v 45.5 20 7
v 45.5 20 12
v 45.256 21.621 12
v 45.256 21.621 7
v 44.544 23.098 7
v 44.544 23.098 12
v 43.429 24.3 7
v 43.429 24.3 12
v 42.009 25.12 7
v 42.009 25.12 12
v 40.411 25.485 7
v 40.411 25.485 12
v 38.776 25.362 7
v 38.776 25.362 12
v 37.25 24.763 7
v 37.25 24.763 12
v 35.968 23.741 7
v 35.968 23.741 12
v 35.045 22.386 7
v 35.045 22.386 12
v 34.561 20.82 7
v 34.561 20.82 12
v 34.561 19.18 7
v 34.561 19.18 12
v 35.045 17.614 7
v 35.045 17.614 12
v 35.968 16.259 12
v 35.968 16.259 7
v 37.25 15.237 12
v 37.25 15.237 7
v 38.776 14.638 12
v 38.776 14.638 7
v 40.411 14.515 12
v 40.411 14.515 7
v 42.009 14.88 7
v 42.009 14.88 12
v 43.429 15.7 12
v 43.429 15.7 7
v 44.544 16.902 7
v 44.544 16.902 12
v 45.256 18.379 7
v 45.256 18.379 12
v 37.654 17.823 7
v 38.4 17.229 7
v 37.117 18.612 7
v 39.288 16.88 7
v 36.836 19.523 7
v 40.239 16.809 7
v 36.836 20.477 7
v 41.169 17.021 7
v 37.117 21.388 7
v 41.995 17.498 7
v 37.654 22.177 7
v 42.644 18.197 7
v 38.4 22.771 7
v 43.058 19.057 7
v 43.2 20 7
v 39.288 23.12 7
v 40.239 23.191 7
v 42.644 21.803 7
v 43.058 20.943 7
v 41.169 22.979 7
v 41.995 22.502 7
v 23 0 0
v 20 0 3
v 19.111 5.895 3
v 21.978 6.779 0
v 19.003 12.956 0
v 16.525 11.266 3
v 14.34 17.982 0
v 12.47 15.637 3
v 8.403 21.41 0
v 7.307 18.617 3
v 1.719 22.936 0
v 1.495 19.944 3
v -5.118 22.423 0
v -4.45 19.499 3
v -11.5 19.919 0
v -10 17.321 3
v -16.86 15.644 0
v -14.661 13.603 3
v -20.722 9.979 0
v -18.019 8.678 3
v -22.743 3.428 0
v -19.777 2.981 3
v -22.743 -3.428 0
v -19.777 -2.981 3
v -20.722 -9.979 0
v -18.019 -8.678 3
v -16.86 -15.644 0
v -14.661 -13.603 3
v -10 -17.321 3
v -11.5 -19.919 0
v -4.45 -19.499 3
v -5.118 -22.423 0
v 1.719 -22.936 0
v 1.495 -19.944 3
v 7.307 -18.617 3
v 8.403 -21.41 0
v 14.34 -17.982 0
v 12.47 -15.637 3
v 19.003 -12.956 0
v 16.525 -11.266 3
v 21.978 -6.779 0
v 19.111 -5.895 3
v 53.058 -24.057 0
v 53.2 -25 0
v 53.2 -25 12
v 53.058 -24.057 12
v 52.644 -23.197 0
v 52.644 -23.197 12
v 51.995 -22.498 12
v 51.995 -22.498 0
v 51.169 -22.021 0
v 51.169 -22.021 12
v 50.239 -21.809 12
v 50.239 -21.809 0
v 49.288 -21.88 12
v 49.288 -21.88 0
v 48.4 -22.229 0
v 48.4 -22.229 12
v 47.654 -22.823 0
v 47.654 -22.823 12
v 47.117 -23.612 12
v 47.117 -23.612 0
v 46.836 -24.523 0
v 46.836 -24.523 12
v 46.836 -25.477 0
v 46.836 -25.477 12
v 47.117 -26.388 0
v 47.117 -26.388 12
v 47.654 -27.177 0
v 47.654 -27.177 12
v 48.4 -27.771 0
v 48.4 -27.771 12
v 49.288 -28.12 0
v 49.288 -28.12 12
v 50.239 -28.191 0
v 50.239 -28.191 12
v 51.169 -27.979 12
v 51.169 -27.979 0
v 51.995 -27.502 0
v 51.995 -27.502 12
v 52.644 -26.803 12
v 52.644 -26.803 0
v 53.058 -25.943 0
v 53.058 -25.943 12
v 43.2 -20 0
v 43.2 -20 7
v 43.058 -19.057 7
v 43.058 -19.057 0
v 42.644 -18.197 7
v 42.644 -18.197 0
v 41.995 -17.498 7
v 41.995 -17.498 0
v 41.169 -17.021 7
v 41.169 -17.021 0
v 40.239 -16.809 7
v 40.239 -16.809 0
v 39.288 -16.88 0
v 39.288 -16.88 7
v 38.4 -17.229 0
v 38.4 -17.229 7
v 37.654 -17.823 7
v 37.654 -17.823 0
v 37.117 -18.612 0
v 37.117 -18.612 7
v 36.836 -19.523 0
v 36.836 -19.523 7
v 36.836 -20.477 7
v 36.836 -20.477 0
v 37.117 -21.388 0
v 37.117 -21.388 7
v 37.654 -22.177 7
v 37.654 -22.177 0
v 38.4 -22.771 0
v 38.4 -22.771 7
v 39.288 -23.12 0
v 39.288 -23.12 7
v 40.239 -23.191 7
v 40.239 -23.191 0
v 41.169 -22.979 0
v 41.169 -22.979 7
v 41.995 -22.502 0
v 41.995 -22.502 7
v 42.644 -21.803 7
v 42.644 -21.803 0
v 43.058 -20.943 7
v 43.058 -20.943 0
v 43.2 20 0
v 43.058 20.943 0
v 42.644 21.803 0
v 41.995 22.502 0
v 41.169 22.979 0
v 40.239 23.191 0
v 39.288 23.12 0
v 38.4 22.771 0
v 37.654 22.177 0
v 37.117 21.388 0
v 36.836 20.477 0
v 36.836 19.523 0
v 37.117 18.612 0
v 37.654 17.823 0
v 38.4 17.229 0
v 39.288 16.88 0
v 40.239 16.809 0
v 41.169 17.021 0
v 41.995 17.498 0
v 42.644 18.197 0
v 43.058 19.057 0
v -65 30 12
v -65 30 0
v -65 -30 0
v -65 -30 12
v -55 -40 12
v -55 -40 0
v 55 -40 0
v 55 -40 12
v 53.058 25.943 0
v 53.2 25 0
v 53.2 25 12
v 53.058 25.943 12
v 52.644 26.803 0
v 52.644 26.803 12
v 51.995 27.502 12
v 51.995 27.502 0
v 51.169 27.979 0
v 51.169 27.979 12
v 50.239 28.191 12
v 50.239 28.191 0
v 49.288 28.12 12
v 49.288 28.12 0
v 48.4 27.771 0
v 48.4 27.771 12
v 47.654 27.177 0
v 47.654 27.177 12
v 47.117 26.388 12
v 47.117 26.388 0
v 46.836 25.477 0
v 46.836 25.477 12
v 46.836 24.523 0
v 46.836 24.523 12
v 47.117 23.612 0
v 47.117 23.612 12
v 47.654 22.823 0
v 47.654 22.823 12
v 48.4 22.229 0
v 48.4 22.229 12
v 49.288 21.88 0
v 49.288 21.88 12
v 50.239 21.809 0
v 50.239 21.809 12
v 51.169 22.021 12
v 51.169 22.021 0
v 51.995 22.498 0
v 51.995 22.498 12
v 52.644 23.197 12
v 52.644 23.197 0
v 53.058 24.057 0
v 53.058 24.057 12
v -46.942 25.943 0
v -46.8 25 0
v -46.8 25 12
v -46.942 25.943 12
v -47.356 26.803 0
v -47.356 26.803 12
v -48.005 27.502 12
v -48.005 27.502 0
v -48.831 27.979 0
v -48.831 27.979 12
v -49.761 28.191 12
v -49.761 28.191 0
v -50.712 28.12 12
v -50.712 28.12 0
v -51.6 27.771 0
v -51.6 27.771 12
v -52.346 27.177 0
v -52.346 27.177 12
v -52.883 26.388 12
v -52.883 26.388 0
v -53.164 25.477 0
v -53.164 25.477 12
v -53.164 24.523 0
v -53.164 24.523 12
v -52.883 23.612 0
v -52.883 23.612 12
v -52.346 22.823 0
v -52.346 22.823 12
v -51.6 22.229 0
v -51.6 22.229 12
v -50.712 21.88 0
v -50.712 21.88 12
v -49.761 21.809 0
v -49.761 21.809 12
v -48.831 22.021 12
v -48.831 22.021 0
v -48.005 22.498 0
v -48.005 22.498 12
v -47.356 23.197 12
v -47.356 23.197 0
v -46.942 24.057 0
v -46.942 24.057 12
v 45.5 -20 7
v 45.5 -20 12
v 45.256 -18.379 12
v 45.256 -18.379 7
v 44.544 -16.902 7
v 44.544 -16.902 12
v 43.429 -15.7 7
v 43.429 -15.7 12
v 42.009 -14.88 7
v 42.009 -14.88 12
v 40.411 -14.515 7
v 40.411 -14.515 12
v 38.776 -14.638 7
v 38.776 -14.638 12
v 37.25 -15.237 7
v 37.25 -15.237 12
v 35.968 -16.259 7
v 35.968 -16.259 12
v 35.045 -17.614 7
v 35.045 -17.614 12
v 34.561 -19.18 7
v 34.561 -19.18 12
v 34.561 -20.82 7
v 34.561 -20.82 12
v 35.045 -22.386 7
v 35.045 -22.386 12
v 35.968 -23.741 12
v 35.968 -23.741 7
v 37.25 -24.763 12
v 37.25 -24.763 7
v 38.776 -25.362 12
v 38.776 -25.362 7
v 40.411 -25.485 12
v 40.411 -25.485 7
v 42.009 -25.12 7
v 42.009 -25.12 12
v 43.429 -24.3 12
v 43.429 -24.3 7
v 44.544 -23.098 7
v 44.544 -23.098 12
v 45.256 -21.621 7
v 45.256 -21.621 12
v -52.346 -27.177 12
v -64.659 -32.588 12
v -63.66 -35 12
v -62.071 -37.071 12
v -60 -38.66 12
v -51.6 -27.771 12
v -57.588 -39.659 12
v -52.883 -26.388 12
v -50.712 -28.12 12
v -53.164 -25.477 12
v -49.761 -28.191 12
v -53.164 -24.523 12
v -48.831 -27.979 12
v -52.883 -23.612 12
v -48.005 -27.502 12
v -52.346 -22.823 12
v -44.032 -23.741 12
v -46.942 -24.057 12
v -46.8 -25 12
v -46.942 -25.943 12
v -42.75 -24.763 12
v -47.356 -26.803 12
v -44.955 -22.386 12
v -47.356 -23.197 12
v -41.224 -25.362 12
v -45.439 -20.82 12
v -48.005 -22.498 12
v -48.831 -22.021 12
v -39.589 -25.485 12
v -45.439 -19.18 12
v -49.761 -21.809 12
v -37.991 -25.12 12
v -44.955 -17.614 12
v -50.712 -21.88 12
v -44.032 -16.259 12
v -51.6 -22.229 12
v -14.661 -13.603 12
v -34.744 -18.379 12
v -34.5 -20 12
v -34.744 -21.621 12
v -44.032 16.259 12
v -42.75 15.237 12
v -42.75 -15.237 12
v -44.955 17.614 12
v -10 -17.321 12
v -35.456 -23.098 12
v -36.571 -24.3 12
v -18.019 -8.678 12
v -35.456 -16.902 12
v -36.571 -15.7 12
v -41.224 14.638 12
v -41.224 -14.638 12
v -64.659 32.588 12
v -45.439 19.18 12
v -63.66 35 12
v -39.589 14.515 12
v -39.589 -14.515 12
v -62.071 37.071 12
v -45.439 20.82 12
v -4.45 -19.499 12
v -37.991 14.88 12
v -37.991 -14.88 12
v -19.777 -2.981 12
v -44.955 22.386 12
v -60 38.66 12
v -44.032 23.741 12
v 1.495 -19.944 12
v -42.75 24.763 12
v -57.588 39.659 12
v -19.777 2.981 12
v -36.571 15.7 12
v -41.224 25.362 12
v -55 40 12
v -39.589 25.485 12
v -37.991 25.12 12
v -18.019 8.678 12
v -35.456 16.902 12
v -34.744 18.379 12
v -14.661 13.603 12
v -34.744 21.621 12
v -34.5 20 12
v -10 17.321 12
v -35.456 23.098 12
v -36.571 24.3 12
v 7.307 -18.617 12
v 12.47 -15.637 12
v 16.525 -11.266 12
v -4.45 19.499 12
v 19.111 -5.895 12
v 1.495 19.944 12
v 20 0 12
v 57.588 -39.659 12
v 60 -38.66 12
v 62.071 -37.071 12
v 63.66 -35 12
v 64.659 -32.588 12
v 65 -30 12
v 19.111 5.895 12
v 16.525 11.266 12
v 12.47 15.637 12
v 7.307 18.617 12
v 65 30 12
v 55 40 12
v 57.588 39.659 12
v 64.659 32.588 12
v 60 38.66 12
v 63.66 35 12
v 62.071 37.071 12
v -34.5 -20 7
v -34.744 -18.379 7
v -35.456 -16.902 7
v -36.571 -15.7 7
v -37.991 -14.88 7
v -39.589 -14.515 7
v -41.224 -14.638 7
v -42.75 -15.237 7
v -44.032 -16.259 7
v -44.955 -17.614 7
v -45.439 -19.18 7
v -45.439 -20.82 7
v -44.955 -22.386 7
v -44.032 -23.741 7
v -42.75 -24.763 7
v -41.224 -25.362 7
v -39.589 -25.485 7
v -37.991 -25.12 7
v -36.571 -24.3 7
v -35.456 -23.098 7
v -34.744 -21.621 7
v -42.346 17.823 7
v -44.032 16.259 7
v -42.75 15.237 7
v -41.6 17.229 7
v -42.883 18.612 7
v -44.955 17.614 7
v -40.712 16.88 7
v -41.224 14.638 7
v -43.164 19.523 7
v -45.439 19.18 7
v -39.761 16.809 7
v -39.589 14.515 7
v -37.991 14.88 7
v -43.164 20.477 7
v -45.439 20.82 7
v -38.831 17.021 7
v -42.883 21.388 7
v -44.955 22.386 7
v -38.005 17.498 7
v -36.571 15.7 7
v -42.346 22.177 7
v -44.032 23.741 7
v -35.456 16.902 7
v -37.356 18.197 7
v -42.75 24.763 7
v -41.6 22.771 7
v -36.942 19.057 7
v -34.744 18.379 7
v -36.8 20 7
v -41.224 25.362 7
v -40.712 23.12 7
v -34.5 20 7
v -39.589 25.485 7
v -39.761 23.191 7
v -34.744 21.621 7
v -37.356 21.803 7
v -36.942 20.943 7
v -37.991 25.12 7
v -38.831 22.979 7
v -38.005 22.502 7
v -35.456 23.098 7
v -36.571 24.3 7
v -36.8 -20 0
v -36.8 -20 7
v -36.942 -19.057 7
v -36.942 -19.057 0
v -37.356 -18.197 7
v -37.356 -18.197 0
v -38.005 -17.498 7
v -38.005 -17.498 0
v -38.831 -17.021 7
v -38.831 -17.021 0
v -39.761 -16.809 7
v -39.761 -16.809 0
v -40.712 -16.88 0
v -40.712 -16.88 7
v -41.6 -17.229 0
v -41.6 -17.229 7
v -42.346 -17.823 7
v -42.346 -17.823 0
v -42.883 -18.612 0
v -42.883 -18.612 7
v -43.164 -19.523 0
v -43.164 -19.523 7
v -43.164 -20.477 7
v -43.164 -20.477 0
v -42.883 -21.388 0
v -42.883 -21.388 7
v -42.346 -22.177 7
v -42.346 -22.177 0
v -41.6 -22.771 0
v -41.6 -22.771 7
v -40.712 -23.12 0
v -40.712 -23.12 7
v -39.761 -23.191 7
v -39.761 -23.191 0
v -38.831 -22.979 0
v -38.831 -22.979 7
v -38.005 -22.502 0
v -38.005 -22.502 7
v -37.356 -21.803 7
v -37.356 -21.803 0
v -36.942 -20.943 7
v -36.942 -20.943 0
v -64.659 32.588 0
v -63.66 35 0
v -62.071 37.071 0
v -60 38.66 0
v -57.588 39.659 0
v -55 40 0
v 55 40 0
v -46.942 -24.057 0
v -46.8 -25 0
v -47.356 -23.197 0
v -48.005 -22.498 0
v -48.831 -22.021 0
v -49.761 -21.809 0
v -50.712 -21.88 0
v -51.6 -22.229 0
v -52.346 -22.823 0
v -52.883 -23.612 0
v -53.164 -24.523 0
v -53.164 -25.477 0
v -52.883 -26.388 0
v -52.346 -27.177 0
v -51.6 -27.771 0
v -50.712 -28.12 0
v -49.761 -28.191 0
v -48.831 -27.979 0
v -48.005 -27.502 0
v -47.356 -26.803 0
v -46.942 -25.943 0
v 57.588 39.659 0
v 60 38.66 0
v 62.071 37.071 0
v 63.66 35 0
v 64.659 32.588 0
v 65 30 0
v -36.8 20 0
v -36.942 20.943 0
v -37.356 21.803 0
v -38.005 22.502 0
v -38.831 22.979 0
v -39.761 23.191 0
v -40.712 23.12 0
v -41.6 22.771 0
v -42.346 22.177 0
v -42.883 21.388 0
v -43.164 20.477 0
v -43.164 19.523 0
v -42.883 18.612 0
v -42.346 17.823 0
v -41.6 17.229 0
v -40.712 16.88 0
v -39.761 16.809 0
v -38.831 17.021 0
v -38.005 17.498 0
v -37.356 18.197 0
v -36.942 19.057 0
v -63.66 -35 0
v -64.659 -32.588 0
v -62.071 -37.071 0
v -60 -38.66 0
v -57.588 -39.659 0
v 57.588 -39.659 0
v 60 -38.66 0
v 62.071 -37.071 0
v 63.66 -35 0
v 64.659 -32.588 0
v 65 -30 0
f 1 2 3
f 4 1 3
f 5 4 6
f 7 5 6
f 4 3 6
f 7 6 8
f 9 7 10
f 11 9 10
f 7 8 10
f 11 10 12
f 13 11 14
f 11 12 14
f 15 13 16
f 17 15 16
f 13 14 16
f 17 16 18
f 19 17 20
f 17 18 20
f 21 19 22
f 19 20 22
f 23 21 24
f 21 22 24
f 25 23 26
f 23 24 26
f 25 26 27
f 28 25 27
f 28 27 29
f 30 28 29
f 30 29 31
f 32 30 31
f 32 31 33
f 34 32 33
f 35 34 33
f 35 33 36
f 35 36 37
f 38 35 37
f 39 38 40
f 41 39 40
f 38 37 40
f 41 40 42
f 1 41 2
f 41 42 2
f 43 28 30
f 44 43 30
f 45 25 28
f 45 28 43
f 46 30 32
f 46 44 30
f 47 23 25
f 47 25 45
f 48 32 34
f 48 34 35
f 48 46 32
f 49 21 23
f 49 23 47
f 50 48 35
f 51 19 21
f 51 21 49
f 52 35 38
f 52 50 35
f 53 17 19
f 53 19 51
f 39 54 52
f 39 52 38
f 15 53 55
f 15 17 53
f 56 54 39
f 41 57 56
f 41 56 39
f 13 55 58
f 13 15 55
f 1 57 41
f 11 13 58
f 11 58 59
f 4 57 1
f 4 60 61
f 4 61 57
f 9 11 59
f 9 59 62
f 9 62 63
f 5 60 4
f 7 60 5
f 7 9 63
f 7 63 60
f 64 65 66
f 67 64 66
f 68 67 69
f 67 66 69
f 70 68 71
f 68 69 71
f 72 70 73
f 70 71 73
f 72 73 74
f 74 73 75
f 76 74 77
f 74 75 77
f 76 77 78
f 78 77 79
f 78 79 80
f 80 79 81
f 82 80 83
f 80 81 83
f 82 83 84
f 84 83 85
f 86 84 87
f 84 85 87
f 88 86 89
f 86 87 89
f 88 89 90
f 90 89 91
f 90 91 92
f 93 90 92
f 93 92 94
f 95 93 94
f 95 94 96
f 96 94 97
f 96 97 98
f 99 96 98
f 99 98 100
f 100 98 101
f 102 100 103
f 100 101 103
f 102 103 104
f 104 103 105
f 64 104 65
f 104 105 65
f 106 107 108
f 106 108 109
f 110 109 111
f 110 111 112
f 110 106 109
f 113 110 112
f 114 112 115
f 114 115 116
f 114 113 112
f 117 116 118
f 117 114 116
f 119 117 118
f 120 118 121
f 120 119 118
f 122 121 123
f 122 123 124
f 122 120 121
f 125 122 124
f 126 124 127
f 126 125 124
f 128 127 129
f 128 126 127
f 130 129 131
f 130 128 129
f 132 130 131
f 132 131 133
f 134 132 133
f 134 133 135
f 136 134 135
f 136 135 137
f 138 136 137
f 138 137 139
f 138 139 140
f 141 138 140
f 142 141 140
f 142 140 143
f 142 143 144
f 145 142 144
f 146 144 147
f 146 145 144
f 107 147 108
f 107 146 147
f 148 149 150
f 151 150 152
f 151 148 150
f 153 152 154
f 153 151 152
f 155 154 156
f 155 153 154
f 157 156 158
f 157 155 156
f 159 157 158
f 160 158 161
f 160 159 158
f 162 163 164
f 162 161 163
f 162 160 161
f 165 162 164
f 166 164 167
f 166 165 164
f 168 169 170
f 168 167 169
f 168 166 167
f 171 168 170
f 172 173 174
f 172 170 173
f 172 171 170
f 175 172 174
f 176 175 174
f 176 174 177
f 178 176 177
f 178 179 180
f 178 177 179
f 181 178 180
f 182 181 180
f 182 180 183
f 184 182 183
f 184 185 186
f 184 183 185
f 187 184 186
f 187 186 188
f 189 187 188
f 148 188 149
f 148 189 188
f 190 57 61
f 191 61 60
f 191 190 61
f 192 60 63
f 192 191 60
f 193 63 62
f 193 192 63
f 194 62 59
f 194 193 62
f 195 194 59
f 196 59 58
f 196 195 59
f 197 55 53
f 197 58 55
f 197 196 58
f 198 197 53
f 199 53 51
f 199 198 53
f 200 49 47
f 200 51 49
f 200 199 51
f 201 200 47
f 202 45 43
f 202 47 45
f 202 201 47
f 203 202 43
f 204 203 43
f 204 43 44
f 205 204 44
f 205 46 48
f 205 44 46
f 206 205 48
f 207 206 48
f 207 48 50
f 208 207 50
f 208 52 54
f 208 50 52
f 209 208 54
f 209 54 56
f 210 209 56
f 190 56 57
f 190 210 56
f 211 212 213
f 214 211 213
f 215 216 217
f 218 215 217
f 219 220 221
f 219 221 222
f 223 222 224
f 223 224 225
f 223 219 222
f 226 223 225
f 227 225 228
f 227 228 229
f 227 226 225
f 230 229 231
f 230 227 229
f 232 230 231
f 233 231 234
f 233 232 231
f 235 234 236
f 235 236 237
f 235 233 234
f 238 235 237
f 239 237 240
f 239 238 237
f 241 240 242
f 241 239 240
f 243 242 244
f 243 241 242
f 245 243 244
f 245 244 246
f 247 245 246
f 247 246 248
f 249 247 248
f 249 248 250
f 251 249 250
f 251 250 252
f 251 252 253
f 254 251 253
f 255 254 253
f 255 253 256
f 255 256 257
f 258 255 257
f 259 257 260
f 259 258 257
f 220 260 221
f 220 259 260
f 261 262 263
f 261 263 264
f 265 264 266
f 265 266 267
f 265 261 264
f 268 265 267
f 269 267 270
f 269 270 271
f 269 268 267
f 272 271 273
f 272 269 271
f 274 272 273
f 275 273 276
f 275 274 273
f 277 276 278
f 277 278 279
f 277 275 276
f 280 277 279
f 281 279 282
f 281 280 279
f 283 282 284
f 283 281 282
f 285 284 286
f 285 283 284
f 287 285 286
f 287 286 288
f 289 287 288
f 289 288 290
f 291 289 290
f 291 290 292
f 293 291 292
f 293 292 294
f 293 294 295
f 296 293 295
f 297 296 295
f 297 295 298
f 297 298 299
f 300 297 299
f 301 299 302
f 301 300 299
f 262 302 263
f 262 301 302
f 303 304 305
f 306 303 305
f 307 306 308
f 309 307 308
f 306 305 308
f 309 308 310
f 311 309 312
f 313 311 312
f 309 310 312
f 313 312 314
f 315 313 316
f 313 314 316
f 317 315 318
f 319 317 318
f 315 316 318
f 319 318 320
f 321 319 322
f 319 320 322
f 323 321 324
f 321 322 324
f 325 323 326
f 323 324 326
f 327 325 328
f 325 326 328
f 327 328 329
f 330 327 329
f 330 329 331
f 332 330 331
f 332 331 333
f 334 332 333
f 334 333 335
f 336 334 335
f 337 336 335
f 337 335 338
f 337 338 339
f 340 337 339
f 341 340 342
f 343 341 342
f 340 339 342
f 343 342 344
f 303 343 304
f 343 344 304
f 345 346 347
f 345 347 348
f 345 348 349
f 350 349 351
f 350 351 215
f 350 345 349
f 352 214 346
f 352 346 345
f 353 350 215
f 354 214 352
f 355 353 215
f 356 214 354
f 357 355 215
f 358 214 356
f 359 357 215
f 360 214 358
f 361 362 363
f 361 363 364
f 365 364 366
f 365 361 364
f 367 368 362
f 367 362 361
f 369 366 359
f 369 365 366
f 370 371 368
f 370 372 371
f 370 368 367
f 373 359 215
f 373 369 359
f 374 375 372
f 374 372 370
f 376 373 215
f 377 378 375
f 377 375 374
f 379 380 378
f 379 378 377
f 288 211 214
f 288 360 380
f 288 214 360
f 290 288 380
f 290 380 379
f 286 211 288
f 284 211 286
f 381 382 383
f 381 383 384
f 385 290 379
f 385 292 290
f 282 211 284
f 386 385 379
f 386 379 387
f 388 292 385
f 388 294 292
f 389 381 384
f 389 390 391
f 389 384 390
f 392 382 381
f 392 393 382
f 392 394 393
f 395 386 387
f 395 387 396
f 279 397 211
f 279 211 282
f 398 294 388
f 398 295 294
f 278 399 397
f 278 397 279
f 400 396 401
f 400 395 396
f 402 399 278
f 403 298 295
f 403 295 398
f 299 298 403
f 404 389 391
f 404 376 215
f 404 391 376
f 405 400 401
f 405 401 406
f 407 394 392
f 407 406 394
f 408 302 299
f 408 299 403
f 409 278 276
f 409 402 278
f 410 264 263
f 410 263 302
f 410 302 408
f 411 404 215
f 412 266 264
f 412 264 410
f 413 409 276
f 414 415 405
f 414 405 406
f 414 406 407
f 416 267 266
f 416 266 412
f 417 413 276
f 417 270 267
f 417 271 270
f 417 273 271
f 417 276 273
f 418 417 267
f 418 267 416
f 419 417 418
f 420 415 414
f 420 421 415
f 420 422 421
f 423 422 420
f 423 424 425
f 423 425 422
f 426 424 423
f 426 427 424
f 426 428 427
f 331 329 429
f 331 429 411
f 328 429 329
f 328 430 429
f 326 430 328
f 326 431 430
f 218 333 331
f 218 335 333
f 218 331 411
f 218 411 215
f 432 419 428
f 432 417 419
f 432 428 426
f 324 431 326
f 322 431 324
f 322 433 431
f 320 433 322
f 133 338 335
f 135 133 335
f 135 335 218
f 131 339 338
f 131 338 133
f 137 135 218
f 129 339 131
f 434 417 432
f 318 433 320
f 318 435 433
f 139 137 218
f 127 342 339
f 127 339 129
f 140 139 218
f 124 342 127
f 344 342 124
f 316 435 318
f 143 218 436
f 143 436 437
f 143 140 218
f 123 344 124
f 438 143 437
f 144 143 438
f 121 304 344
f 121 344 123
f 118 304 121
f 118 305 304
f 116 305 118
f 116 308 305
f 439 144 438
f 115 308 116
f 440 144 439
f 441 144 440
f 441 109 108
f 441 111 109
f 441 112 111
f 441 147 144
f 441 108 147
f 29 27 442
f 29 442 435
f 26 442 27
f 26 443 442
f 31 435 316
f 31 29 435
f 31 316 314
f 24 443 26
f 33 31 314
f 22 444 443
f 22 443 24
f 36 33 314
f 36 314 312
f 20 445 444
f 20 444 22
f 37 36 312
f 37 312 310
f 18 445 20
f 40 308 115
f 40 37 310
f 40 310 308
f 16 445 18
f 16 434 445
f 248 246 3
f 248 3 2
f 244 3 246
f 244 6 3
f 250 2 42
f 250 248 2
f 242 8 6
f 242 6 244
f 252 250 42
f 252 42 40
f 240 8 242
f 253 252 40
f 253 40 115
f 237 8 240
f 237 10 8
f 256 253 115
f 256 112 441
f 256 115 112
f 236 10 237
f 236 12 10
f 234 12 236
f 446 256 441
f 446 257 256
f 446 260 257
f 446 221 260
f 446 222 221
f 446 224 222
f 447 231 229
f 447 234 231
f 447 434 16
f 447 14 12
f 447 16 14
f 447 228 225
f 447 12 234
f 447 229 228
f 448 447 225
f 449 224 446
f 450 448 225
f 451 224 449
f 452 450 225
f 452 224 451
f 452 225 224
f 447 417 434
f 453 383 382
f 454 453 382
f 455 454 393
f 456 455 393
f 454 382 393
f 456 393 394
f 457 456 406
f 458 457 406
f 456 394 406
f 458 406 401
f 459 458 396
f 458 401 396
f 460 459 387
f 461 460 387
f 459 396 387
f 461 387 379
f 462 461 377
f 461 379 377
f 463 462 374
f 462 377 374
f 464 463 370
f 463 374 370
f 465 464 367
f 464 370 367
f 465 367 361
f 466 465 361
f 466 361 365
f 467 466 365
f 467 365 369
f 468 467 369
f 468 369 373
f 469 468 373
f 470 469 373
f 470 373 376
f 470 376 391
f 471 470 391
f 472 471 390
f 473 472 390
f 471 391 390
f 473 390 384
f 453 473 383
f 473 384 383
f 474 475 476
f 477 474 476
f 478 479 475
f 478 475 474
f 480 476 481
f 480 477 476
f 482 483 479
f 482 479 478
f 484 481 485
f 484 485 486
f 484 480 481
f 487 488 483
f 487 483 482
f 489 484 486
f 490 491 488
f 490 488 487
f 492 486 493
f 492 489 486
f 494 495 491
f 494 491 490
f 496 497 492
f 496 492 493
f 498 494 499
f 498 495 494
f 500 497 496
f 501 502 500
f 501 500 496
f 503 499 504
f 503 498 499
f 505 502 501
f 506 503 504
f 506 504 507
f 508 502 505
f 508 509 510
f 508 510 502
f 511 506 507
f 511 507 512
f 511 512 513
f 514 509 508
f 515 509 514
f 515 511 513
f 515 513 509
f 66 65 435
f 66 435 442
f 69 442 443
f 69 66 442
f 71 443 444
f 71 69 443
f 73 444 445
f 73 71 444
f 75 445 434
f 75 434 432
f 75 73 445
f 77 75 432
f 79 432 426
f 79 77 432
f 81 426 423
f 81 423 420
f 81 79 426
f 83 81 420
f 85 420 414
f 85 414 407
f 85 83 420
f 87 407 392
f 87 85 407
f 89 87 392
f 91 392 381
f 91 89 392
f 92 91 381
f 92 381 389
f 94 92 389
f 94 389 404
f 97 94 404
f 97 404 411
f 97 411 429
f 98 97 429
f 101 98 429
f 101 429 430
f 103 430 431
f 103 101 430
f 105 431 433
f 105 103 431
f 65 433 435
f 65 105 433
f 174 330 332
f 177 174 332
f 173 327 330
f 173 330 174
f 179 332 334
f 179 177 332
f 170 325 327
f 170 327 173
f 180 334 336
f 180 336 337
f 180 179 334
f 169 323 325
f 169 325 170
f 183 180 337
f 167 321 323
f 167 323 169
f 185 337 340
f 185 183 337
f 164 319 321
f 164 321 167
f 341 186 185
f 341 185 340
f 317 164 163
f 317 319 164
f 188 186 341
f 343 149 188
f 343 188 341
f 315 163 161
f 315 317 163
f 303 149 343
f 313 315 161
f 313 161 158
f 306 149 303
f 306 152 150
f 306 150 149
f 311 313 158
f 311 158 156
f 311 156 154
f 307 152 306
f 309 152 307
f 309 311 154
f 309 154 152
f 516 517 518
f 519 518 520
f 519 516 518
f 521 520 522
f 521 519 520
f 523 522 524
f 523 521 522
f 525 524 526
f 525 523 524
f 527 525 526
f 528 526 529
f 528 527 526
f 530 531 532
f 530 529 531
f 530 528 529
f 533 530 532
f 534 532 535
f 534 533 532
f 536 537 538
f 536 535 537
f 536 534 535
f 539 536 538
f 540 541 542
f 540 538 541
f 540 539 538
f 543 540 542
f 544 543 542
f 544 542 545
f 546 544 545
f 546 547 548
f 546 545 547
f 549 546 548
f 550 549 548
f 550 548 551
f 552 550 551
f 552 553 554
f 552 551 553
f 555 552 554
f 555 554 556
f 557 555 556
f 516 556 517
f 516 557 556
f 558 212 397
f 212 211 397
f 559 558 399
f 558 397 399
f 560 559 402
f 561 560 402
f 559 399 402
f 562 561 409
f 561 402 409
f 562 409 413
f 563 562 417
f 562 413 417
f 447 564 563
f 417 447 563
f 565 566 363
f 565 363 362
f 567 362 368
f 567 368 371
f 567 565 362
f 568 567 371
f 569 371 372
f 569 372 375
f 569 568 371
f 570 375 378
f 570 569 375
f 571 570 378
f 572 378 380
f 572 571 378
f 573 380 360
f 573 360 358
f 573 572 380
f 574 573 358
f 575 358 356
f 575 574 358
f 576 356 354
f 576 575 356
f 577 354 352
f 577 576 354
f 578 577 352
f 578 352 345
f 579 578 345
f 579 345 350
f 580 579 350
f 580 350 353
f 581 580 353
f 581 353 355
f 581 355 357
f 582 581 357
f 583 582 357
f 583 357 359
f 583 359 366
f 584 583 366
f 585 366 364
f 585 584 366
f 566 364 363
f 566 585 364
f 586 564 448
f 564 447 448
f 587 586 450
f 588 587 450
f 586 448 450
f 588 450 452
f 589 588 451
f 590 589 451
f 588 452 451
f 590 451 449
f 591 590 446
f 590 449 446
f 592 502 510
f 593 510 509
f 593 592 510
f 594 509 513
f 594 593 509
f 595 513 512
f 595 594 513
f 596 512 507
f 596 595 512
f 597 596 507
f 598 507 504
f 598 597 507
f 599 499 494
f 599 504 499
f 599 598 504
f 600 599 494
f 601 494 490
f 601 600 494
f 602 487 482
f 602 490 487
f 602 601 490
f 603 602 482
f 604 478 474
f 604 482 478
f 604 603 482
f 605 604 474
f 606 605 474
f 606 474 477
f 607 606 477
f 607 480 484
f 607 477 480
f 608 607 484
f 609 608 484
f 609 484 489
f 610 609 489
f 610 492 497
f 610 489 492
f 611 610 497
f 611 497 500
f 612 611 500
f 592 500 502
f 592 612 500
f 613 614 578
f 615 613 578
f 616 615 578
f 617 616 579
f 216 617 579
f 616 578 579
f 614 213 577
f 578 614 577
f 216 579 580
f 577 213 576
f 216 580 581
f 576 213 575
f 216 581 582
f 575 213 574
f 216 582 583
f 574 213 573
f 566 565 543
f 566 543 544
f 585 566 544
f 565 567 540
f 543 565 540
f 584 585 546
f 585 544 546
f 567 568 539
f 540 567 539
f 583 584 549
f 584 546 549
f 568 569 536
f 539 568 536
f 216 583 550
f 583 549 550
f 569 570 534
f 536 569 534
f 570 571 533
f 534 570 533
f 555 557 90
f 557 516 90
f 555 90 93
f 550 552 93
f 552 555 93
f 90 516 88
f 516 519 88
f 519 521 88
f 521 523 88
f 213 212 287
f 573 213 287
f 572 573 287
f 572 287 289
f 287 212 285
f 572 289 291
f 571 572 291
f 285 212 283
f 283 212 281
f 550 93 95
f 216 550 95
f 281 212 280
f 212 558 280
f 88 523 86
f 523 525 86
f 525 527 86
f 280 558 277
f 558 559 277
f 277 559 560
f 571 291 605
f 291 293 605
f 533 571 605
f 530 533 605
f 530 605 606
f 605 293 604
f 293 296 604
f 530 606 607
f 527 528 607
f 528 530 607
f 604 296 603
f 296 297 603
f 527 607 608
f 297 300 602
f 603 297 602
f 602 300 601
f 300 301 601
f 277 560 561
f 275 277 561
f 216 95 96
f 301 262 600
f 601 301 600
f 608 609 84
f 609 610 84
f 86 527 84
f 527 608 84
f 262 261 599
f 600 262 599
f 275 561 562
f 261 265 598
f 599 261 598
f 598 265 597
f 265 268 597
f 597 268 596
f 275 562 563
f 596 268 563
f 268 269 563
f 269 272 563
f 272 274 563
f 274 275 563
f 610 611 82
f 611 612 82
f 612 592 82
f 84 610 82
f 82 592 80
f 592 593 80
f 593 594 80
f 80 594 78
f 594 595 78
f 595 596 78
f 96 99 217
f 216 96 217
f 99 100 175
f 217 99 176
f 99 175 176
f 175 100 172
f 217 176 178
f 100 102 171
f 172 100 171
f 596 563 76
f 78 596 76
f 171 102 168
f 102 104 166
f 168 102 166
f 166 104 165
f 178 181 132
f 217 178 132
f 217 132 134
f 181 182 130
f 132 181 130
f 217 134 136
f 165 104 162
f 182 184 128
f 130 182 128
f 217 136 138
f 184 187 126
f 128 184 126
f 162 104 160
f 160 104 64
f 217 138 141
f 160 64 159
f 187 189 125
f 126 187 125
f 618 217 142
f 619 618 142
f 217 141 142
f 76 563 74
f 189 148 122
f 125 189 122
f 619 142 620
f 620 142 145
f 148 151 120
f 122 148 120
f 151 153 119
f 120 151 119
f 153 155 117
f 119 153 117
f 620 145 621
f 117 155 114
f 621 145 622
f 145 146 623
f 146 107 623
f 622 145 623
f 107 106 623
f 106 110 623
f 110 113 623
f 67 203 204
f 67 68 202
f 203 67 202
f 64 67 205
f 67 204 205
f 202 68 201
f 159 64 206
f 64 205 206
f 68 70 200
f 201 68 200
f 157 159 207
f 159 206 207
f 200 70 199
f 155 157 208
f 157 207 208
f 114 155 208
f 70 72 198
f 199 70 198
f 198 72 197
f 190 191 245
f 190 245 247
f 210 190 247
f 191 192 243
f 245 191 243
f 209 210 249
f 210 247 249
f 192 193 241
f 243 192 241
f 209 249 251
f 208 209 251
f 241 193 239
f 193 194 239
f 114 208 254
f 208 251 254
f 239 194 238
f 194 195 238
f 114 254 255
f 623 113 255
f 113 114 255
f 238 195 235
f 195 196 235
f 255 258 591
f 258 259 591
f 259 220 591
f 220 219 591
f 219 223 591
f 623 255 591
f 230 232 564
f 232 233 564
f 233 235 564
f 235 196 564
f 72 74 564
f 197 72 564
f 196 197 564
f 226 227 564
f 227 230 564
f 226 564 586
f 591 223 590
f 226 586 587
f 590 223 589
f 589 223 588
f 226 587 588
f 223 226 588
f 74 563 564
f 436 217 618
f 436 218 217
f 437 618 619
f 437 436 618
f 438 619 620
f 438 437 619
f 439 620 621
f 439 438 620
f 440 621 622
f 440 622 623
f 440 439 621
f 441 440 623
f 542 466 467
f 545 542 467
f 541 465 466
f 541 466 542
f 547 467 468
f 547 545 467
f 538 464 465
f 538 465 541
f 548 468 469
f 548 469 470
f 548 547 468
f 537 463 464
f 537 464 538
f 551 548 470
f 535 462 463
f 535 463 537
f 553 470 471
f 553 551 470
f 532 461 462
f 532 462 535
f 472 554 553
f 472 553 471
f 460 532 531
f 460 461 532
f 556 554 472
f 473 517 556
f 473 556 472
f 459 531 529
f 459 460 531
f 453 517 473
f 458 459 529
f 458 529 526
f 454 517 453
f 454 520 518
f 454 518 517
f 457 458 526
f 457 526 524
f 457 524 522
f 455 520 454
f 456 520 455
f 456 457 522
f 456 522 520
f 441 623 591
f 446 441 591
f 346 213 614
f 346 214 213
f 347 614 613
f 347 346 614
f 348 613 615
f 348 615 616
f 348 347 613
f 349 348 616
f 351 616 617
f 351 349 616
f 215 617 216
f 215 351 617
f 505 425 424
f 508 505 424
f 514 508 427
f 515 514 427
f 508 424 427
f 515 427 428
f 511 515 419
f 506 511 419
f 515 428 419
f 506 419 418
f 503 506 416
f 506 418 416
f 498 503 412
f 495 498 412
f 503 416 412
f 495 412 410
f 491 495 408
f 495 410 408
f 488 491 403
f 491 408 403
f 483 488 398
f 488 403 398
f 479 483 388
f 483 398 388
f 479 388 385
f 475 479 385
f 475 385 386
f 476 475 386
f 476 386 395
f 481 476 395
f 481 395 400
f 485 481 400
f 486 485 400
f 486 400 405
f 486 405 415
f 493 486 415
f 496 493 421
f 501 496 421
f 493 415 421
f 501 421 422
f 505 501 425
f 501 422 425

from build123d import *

# Parameters (mm, degrees)
SKETCH_1_R          = 3.2
SKETCH_1_R_2        = 20
EXTRUDE_1_DEPTH     = 12
FILLET_1_R          = 10
CHAMFER_1_SIZE      = 3
SKETCH_2_R          = 5.5
CUT_EXTRUDE_1_DEPTH = 5


with BuildPart() as part:
    # 草图1 → 凸台-拉伸1 (new body)
    with BuildSketch(Plane.XY):
        Polygon((50, 40), (-50, 40), (-65, 40), (-65, -40), (-50, -40), (50, -40), (65, -40), (65, 40), align=None)
        with Locations((-50, -25)):
            Circle(SKETCH_1_R, mode=Mode.SUBTRACT)
        with Locations((-40, -20)):
            Circle(SKETCH_1_R, mode=Mode.SUBTRACT)
        with Locations((40, -20)):
            Circle(SKETCH_1_R, mode=Mode.SUBTRACT)
        with Locations((50, -25)):
            Circle(SKETCH_1_R, mode=Mode.SUBTRACT)
        with Locations((-50, 25)):
            Circle(SKETCH_1_R, mode=Mode.SUBTRACT)
        with Locations((-40, 20)):
            Circle(SKETCH_1_R, mode=Mode.SUBTRACT)
        Circle(SKETCH_1_R_2, mode=Mode.SUBTRACT)
        with Locations((40, 20)):
            Circle(SKETCH_1_R, mode=Mode.SUBTRACT)
        with Locations((50, 25)):
            Circle(SKETCH_1_R, mode=Mode.SUBTRACT)
    extrude(amount=EXTRUDE_1_DEPTH)

    # 圆角1
    fillet_1_edges = [part.edges().sort_by_distance(p)[0] for p in [
        (-65, -40, 6),
        (-65, 40, 6),
        (65, 40, 6),
        (65, -40, 6),
    ]]
    fillet(fillet_1_edges, radius=FILLET_1_R)

    # 倒角1
    chamfer_1_edges = [part.edges().sort_by_distance(p)[0] for p in [
        (-20, 0, 0),
    ]]
    chamfer(chamfer_1_edges, length=CHAMFER_1_SIZE)

    # 草图2 → 切除-拉伸1 (cut)
    with BuildSketch(Plane.XY.offset(12)):
        with Locations((-40, 20)):
            Circle(SKETCH_2_R)
        with Locations((-40, -20)):
            Circle(SKETCH_2_R)
        with Locations((40, 20)):
            Circle(SKETCH_2_R)
        with Locations((40, -20)):
            Circle(SKETCH_2_R)
    extrude(amount=-CUT_EXTRUDE_1_DEPTH, mode=Mode.SUBTRACT)


solid = part.part
